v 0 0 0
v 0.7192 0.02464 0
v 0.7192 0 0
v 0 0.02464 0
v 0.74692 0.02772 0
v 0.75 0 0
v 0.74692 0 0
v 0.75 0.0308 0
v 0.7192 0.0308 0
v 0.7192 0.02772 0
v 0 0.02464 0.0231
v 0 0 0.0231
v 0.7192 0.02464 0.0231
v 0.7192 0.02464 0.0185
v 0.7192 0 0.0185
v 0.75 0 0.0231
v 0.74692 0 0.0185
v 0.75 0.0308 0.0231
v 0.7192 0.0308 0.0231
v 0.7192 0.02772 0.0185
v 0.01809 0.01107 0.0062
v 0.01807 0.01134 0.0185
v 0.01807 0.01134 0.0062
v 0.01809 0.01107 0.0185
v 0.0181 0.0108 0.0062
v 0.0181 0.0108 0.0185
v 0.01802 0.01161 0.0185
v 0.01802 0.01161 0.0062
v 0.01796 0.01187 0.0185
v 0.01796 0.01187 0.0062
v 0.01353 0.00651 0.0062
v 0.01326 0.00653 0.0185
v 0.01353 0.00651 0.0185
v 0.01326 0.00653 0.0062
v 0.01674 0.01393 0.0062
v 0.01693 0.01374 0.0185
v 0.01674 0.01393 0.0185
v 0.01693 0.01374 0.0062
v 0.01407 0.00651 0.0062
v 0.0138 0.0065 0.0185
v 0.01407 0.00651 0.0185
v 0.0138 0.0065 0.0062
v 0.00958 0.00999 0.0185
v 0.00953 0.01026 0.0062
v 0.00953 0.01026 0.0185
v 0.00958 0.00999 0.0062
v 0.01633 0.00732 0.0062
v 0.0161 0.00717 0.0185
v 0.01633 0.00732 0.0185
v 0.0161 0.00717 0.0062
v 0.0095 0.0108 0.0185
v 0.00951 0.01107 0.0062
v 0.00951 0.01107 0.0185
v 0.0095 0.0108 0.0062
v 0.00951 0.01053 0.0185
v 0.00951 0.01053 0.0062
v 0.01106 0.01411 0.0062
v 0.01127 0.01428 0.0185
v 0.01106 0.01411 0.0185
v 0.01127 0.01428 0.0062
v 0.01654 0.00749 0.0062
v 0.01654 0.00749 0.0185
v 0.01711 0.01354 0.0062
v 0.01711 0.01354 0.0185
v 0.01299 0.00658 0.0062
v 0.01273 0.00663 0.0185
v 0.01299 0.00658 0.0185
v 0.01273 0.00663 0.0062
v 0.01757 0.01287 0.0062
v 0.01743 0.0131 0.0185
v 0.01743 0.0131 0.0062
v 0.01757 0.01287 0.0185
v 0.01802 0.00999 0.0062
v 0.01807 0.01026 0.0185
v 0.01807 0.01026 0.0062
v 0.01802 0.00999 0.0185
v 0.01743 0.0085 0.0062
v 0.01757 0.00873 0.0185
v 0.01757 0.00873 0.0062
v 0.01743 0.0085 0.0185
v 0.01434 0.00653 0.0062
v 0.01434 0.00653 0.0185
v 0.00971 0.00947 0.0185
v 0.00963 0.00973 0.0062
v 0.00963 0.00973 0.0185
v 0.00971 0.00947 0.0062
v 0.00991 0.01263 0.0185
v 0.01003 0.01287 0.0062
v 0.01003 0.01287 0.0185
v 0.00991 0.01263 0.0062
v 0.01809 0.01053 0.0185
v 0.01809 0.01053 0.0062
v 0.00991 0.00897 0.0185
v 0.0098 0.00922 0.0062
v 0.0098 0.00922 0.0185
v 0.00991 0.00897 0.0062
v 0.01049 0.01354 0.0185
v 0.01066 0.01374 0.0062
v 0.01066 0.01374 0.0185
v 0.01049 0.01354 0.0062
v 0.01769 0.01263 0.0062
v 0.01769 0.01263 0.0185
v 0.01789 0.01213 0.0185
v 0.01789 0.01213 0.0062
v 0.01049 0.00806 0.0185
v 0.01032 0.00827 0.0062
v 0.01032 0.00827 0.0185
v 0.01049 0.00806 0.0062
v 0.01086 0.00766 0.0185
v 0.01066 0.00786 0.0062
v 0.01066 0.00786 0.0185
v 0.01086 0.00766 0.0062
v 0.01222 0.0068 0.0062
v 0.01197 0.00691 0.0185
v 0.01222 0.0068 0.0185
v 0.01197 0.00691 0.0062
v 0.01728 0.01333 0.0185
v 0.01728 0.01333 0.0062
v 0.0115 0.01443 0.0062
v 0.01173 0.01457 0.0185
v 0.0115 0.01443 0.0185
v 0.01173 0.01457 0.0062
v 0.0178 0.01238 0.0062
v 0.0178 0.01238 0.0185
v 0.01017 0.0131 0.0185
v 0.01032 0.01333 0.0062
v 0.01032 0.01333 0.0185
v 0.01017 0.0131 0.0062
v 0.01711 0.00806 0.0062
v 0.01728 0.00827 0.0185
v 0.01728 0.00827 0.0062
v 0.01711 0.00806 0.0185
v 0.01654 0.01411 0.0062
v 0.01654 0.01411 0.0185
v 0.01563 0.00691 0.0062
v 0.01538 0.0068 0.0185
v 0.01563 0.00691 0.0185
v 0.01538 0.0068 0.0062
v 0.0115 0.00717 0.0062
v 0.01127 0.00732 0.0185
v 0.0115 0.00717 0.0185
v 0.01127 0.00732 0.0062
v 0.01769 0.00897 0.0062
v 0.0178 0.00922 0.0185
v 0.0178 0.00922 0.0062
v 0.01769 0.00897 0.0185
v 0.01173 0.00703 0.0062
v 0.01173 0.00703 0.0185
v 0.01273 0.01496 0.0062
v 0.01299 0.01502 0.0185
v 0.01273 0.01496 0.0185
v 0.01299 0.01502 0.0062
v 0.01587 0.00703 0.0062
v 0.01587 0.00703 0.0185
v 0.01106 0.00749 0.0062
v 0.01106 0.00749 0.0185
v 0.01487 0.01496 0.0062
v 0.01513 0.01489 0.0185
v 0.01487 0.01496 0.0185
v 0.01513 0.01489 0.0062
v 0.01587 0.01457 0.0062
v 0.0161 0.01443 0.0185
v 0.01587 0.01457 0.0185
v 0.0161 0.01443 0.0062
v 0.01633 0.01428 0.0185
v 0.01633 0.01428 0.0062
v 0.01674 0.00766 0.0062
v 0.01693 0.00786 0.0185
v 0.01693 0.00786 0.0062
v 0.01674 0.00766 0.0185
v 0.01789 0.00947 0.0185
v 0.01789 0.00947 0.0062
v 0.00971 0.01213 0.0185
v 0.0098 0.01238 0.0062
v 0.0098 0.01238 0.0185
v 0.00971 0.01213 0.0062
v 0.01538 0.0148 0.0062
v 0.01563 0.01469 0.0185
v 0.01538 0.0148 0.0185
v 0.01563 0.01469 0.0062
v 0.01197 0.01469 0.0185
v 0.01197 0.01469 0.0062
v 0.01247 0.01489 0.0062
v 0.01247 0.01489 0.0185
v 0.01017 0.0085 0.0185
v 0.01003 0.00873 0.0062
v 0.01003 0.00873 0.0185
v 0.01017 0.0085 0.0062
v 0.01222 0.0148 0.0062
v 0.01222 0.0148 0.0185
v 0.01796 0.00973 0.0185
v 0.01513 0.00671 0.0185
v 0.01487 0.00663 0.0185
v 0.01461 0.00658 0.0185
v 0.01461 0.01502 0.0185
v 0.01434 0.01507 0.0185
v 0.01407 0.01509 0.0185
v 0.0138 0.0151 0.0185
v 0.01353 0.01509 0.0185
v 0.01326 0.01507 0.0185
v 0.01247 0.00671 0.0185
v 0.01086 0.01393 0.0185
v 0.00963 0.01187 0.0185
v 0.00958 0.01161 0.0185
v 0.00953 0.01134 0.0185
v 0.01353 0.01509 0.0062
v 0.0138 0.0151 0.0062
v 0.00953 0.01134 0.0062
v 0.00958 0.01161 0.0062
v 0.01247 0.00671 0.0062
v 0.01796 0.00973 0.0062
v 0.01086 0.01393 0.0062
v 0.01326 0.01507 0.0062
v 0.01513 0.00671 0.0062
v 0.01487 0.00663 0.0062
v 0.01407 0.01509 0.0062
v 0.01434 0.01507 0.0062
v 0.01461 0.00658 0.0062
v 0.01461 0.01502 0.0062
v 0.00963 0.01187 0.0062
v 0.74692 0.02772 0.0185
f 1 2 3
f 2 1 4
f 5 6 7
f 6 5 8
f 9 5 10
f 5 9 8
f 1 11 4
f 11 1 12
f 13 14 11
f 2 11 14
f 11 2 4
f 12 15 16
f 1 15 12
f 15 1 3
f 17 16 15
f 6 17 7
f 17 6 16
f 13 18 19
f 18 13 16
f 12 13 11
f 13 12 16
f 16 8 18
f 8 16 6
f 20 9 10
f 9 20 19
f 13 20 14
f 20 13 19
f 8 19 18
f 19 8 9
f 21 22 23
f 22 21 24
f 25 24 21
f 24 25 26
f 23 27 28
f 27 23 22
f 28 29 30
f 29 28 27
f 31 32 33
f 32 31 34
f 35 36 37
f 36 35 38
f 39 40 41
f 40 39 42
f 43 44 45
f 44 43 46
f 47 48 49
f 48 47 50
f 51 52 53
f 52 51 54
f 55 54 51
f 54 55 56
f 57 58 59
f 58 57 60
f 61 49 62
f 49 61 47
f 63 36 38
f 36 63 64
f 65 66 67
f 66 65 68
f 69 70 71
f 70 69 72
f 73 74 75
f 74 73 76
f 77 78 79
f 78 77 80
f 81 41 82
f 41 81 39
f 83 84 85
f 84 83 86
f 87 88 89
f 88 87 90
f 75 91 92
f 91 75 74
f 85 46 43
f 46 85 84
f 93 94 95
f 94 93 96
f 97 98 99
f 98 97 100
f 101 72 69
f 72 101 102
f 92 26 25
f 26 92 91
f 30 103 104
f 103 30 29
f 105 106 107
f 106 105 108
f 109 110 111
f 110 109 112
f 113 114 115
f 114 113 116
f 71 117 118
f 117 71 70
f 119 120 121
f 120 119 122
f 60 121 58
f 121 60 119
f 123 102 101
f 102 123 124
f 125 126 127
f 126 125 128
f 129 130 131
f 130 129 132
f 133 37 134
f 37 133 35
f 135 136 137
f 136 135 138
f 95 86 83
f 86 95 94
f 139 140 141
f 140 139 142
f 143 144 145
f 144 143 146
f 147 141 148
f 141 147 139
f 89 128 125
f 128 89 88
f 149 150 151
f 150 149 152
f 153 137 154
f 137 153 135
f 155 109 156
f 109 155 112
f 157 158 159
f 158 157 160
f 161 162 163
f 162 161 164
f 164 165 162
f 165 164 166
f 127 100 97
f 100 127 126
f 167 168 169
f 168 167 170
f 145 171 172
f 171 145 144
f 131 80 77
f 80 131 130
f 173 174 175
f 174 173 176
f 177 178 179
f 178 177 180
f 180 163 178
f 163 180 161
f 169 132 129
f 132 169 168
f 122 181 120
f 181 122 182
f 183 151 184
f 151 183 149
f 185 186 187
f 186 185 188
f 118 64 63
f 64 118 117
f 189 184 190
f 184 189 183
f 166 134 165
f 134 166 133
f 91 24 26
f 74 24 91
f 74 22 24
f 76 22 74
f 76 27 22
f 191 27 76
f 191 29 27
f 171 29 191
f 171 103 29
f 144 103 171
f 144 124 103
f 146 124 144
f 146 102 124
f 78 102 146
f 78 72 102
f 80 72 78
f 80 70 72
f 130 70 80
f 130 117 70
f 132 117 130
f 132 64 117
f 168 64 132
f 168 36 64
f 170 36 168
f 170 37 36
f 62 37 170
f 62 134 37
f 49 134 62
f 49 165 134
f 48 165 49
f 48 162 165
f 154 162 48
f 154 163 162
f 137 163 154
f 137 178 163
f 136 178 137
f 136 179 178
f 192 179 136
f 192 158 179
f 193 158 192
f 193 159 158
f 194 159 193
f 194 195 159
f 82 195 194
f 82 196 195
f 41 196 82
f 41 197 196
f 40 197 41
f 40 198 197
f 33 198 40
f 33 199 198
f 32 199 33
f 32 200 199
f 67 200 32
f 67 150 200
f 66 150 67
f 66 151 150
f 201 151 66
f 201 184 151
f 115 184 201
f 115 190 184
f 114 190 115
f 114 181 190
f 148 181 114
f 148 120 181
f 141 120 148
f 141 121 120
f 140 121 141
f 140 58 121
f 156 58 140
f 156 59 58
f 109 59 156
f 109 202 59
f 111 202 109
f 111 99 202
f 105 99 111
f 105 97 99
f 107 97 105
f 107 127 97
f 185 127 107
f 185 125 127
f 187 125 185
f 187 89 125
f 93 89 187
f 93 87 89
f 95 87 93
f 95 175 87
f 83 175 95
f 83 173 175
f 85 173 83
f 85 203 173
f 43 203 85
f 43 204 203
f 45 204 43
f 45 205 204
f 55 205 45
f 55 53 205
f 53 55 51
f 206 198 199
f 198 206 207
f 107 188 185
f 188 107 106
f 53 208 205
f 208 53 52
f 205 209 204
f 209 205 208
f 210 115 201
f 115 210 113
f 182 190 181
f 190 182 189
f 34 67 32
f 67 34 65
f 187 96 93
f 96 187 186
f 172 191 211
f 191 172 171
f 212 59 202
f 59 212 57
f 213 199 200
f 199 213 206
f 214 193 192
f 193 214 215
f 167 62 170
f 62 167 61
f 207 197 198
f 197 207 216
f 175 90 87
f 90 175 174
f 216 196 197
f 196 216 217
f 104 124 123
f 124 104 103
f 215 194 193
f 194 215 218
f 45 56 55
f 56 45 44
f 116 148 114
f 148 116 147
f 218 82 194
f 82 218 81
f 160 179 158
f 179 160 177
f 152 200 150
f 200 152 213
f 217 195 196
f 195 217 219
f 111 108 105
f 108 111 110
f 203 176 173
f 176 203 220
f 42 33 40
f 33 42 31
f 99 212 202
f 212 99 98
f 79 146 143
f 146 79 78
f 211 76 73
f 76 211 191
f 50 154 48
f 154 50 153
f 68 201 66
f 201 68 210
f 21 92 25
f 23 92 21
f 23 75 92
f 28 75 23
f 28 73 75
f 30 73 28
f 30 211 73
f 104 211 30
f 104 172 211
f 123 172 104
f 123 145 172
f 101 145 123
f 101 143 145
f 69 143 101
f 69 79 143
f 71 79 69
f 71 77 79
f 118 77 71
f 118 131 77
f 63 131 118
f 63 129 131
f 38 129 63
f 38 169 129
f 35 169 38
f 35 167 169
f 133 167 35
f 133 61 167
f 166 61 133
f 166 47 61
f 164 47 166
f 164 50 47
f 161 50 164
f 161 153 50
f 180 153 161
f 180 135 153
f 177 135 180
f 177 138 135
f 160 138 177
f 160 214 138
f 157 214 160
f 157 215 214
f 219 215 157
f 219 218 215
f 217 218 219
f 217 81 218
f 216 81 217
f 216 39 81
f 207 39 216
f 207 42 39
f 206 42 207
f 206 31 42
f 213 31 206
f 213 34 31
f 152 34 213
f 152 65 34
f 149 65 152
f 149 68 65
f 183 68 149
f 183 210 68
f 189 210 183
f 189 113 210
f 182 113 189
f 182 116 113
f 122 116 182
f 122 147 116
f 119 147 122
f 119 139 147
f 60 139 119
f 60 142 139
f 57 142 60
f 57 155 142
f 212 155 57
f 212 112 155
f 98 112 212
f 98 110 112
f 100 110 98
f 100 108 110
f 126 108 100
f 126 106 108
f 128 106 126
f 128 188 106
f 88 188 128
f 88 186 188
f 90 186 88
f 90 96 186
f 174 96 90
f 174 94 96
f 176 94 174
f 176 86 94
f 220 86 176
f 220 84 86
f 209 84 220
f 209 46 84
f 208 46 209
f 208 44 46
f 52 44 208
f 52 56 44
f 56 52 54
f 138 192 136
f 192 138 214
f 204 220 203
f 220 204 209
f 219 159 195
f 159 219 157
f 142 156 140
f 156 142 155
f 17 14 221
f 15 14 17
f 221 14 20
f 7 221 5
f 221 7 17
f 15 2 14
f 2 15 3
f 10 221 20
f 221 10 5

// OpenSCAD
$fn = 100;

// === Parametric Dimensions (mm) ===
rail_len = 0.748506;
rail_wid = 0.024642;
rail_h   = 0.018482;
layer_thick = 0.00462;

hole_r = 0.0043;
hole_y_off = 0.0108;
hole_x1 = 0.0138;
hole_x2 = 0.7346;
z_hole_start = 0.0062;
z_hole_h = 0.0123;

block_w = 0.030803;
block_x = 0.7192;
block_y = 0;
block_hole_x = 0.7361;
block_hole_y = 0.0192;

cutout_w = 0.027722;
cutout_x = block_x;
cutout_y = block_y;
cutout_z_bot = -0.0585;
cutout_z_top = 0.0185;
cutout_h = cutout_z_top - cutout_z_bot;

// === Reusable Modules ===
module blind_recess(x, y, z_start, height, radius) {
    translate([x, y, z_start])
        cylinder(h = height, r = radius);
}

module layered_base(w, d, base_h, top_h) {
    cube([w, d, base_h]);
    translate([0, 0, base_h])
        cube([w, d, top_h]);
}

// === Main Assembly ===
difference() {
    // Positive solid volumes
    union() {
        // Rail lower body and shallow top layer
        layered_base(rail_len, rail_wid, rail_h, layer_thick);

        // End block lower body and shallow top layer
        translate([block_x, block_y, 0])
            layered_base(block_w, block_w, rail_h, layer_thick);
    }

    // Subtractive features
    // Rail circular recesses
    blind_recess(hole_x1, hole_y_off, z_hole_start, z_hole_h, hole_r);
    blind_recess(hole_x2, hole_y_off, z_hole_start, z_hole_h, hole_r);

    // End block circular recess
    blind_recess(block_hole_x, block_hole_y, z_hole_start, z_hole_h, hole_r);

    // End block deep rectangular cutout
    translate([cutout_x, cutout_y, cutout_z_bot])
        cube([cutout_w, cutout_w, cutout_h]);
}
